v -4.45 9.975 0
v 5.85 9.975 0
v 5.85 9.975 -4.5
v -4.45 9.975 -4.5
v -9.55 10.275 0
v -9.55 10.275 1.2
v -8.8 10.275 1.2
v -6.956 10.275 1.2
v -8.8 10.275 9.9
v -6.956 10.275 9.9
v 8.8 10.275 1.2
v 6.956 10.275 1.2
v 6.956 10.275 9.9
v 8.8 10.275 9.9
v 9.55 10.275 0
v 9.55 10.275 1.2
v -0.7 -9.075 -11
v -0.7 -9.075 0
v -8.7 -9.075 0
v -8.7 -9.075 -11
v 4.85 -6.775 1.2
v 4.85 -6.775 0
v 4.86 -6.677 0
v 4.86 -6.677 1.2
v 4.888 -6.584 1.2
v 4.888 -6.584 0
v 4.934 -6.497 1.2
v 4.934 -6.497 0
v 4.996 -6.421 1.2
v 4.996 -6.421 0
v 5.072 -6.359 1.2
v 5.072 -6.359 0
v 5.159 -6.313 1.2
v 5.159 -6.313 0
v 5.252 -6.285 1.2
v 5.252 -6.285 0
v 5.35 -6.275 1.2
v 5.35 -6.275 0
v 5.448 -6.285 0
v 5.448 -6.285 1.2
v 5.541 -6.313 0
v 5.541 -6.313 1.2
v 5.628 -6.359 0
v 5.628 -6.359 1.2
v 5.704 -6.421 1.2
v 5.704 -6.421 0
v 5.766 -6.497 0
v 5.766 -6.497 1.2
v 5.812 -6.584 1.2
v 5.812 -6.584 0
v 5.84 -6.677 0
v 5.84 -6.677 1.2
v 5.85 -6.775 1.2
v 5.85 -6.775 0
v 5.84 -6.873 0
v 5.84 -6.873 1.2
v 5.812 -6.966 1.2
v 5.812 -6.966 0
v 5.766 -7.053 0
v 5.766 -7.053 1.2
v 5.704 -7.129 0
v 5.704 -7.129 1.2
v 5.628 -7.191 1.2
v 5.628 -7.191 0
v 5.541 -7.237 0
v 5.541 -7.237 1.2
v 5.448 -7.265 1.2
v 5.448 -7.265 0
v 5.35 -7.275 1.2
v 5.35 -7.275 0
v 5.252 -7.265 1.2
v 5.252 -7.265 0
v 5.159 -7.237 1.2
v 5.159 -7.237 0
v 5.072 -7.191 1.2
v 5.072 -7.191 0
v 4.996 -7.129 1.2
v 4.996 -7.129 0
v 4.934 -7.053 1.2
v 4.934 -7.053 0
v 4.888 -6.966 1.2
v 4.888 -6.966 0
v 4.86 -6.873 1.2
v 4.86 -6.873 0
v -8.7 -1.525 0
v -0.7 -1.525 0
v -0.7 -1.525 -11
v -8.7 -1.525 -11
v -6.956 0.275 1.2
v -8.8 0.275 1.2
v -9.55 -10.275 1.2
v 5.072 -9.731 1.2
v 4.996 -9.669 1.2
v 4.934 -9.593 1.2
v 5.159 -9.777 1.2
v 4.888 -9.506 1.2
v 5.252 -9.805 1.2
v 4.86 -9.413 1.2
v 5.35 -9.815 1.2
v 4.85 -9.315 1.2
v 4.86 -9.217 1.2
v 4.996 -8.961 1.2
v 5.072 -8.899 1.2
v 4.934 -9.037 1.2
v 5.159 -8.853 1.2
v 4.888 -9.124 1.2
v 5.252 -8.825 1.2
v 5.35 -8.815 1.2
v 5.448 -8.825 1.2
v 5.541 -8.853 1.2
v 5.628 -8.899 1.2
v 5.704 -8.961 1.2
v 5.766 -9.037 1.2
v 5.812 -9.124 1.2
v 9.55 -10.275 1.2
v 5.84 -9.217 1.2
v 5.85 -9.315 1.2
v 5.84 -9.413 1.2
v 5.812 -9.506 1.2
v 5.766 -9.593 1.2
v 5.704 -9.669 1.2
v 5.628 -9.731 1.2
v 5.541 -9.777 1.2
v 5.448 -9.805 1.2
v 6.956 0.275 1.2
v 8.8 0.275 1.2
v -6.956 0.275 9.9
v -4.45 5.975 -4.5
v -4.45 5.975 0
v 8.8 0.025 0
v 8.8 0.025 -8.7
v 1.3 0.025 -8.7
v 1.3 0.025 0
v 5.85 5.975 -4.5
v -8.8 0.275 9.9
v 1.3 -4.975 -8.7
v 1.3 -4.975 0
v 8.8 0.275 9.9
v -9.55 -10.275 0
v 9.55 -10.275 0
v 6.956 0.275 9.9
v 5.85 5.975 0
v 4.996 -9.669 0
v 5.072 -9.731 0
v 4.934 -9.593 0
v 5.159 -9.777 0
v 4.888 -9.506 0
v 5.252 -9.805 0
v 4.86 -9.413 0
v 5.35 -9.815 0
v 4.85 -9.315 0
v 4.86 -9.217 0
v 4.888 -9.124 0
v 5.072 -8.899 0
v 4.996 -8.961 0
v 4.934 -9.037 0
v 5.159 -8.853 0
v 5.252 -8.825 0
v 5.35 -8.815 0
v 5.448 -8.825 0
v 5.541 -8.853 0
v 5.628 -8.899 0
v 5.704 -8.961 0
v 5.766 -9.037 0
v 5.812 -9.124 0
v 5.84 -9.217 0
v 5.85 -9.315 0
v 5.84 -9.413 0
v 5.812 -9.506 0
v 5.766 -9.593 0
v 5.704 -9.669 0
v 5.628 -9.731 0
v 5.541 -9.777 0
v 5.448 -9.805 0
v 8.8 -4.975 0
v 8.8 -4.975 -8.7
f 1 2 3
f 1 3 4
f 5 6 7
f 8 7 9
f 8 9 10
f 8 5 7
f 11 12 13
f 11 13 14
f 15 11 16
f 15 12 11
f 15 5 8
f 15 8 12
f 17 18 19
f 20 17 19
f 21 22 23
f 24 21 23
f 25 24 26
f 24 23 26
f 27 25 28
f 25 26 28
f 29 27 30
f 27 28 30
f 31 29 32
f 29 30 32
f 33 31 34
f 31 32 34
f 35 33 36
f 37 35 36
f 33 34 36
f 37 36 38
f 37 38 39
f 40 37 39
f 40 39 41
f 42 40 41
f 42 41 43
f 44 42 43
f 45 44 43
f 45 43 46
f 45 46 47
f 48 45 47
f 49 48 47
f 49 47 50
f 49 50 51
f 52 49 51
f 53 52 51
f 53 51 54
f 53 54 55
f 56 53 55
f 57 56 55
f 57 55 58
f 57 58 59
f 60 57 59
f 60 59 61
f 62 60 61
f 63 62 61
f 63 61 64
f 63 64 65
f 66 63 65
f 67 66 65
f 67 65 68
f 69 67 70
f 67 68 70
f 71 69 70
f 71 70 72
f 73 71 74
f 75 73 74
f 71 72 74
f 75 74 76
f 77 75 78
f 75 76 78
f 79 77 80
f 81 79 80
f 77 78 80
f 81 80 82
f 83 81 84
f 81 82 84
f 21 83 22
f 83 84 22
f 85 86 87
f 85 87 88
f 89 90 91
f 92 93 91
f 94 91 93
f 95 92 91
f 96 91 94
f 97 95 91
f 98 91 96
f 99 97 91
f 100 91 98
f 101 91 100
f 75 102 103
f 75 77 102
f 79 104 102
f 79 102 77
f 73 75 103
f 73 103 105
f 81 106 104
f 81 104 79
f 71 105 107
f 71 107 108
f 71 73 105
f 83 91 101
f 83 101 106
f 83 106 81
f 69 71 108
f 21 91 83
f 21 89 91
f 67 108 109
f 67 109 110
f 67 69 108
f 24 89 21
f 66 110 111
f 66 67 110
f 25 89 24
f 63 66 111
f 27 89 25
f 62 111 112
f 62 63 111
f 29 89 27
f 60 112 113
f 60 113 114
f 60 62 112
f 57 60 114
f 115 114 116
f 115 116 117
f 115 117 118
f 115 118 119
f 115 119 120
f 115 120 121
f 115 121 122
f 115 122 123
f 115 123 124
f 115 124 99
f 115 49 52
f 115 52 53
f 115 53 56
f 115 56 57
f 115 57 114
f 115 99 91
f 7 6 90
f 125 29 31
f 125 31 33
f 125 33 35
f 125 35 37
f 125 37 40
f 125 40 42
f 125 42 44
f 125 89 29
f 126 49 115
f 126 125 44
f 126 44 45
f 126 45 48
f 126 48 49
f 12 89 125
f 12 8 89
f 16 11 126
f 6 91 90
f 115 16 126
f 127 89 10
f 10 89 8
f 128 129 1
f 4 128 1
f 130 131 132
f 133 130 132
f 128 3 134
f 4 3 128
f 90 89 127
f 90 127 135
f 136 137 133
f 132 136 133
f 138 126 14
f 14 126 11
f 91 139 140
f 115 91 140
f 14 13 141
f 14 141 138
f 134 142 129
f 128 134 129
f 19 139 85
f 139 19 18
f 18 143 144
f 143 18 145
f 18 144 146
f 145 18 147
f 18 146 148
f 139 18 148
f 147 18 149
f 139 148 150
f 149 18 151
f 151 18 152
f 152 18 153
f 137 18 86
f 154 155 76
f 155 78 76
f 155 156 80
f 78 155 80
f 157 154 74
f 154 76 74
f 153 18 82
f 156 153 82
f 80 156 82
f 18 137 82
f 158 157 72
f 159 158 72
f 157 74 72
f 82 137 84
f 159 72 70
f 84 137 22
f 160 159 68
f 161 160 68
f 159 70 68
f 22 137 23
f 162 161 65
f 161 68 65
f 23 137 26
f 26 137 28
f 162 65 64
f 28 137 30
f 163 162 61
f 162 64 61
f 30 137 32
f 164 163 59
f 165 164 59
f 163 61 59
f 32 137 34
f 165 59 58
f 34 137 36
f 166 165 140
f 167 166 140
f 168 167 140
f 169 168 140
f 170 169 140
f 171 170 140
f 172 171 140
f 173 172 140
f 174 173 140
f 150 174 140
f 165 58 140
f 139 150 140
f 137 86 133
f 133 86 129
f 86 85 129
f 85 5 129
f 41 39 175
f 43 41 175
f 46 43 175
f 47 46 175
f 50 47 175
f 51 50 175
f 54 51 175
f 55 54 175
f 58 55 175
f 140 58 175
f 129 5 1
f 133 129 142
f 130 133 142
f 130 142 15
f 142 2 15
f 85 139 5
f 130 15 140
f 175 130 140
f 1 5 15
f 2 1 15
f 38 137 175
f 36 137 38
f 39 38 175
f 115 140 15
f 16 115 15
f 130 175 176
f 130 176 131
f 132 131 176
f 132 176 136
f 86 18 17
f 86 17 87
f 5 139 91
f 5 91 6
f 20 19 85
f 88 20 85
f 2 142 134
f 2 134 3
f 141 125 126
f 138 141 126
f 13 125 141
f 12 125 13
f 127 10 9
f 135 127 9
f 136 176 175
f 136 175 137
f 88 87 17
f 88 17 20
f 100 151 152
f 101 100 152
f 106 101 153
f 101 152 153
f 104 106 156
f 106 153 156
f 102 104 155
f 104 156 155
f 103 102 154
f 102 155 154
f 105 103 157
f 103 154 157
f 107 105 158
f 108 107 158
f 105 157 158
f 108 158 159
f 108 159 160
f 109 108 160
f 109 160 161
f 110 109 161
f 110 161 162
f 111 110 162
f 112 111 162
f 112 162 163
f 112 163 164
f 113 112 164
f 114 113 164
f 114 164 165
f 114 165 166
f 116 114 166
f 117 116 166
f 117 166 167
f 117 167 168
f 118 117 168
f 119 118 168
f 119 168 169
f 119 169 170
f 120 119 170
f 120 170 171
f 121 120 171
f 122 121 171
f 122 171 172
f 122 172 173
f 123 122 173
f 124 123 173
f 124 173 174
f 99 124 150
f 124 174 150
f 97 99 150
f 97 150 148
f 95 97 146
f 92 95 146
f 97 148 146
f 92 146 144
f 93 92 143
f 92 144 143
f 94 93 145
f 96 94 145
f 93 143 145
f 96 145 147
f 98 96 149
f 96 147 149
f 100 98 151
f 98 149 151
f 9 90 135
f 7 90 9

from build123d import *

# Parameters (mm, degrees)
SKETCH_1_W          = 19.1
SKETCH_1_H          = 20.55
EXTRUDE_1_DEPTH     = 1.2
SKETCH_2_W          = 1.844375839
SKETCH_2_H          = 10
EXTRUDE_2_DEPTH     = 8.7
SKETCH_3_W          = 7.5
SKETCH_3_H          = 5
EXTRUDE_3_DEPTH     = 8.7
SKETCH_4_W          = 8
SKETCH_4_H          = 7.55
EXTRUDE_4_DEPTH     = 11
SKETCH_5_W          = 10.3
SKETCH_5_H          = 4
EXTRUDE_5_DEPTH     = 4.5
SKETCH_6_R          = 0.5
CUT_EXTRUDE_1_DEPTH = 18.826332349


with BuildPart() as part:
    # ｽｹｯﾁ1 → ﾎﾞｽ - 押し出し1 (new body)
    with BuildSketch(Plane.XY):
        Rectangle(SKETCH_1_W, SKETCH_1_H)
    extrude(amount=EXTRUDE_1_DEPTH)

    # ｽｹｯﾁ2 → ﾎﾞｽ - 押し出し2 (add)
    with BuildSketch(Plane.XY.offset(1.2)):
        with Locations((7.877812081, 5.275)):
            Rectangle(SKETCH_2_W, SKETCH_2_H)
    extrude_2 = extrude(amount=EXTRUDE_2_DEPTH)

    # ﾐﾗｰ1: ﾎﾞｽ - 押し出し2 across plane
    add(extrude_2.mirror(Plane(origin=(0, 0, 0), x_dir=(0, 0, 1), z_dir=(1, 0, 0))))

    # ｽｹｯﾁ3 → ﾎﾞｽ - 押し出し3 (add)
    with BuildSketch(Plane(origin=(0, 0, 0), x_dir=(-1, 0, 0), z_dir=(0, 0, -1))):
        with Locations((-5.05, -2.475)):
            Rectangle(SKETCH_3_W, SKETCH_3_H)
    extrude(amount=EXTRUDE_3_DEPTH)

    # ｽｹｯﾁ4 → ﾎﾞｽ - 押し出し4 (add)
    with BuildSketch(Plane(origin=(0, 0, 0), x_dir=(-1, 0, 0), z_dir=(0, 0, -1))):
        with Locations((4.7, -5.3)):
            Rectangle(SKETCH_4_W, SKETCH_4_H)
    extrude(amount=EXTRUDE_4_DEPTH)

    # ｽｹｯﾁ5 → ﾎﾞｽ - 押し出し5 (add)
    with BuildSketch(Plane(origin=(0, 0, 0), x_dir=(-1, 0, 0), z_dir=(0, 0, -1))):
        with Locations((-0.7, 7.975)):
            Rectangle(SKETCH_5_W, SKETCH_5_H)
    extrude(amount=EXTRUDE_5_DEPTH)

    # ｽｹｯﾁ6 → ｶｯﾄ - 押し出し1 (cut, through all)
    with BuildSketch(Plane(origin=(0, 0, 0), x_dir=(-1, 0, 0), z_dir=(0, 0, -1))):
        with Locations((-5.35, -6.775)):
            Circle(SKETCH_6_R)
        with Locations((-5.35, -9.315)):
            Circle(SKETCH_6_R)
    extrude(amount=-CUT_EXTRUDE_1_DEPTH, mode=Mode.SUBTRACT)


solid = part.part
